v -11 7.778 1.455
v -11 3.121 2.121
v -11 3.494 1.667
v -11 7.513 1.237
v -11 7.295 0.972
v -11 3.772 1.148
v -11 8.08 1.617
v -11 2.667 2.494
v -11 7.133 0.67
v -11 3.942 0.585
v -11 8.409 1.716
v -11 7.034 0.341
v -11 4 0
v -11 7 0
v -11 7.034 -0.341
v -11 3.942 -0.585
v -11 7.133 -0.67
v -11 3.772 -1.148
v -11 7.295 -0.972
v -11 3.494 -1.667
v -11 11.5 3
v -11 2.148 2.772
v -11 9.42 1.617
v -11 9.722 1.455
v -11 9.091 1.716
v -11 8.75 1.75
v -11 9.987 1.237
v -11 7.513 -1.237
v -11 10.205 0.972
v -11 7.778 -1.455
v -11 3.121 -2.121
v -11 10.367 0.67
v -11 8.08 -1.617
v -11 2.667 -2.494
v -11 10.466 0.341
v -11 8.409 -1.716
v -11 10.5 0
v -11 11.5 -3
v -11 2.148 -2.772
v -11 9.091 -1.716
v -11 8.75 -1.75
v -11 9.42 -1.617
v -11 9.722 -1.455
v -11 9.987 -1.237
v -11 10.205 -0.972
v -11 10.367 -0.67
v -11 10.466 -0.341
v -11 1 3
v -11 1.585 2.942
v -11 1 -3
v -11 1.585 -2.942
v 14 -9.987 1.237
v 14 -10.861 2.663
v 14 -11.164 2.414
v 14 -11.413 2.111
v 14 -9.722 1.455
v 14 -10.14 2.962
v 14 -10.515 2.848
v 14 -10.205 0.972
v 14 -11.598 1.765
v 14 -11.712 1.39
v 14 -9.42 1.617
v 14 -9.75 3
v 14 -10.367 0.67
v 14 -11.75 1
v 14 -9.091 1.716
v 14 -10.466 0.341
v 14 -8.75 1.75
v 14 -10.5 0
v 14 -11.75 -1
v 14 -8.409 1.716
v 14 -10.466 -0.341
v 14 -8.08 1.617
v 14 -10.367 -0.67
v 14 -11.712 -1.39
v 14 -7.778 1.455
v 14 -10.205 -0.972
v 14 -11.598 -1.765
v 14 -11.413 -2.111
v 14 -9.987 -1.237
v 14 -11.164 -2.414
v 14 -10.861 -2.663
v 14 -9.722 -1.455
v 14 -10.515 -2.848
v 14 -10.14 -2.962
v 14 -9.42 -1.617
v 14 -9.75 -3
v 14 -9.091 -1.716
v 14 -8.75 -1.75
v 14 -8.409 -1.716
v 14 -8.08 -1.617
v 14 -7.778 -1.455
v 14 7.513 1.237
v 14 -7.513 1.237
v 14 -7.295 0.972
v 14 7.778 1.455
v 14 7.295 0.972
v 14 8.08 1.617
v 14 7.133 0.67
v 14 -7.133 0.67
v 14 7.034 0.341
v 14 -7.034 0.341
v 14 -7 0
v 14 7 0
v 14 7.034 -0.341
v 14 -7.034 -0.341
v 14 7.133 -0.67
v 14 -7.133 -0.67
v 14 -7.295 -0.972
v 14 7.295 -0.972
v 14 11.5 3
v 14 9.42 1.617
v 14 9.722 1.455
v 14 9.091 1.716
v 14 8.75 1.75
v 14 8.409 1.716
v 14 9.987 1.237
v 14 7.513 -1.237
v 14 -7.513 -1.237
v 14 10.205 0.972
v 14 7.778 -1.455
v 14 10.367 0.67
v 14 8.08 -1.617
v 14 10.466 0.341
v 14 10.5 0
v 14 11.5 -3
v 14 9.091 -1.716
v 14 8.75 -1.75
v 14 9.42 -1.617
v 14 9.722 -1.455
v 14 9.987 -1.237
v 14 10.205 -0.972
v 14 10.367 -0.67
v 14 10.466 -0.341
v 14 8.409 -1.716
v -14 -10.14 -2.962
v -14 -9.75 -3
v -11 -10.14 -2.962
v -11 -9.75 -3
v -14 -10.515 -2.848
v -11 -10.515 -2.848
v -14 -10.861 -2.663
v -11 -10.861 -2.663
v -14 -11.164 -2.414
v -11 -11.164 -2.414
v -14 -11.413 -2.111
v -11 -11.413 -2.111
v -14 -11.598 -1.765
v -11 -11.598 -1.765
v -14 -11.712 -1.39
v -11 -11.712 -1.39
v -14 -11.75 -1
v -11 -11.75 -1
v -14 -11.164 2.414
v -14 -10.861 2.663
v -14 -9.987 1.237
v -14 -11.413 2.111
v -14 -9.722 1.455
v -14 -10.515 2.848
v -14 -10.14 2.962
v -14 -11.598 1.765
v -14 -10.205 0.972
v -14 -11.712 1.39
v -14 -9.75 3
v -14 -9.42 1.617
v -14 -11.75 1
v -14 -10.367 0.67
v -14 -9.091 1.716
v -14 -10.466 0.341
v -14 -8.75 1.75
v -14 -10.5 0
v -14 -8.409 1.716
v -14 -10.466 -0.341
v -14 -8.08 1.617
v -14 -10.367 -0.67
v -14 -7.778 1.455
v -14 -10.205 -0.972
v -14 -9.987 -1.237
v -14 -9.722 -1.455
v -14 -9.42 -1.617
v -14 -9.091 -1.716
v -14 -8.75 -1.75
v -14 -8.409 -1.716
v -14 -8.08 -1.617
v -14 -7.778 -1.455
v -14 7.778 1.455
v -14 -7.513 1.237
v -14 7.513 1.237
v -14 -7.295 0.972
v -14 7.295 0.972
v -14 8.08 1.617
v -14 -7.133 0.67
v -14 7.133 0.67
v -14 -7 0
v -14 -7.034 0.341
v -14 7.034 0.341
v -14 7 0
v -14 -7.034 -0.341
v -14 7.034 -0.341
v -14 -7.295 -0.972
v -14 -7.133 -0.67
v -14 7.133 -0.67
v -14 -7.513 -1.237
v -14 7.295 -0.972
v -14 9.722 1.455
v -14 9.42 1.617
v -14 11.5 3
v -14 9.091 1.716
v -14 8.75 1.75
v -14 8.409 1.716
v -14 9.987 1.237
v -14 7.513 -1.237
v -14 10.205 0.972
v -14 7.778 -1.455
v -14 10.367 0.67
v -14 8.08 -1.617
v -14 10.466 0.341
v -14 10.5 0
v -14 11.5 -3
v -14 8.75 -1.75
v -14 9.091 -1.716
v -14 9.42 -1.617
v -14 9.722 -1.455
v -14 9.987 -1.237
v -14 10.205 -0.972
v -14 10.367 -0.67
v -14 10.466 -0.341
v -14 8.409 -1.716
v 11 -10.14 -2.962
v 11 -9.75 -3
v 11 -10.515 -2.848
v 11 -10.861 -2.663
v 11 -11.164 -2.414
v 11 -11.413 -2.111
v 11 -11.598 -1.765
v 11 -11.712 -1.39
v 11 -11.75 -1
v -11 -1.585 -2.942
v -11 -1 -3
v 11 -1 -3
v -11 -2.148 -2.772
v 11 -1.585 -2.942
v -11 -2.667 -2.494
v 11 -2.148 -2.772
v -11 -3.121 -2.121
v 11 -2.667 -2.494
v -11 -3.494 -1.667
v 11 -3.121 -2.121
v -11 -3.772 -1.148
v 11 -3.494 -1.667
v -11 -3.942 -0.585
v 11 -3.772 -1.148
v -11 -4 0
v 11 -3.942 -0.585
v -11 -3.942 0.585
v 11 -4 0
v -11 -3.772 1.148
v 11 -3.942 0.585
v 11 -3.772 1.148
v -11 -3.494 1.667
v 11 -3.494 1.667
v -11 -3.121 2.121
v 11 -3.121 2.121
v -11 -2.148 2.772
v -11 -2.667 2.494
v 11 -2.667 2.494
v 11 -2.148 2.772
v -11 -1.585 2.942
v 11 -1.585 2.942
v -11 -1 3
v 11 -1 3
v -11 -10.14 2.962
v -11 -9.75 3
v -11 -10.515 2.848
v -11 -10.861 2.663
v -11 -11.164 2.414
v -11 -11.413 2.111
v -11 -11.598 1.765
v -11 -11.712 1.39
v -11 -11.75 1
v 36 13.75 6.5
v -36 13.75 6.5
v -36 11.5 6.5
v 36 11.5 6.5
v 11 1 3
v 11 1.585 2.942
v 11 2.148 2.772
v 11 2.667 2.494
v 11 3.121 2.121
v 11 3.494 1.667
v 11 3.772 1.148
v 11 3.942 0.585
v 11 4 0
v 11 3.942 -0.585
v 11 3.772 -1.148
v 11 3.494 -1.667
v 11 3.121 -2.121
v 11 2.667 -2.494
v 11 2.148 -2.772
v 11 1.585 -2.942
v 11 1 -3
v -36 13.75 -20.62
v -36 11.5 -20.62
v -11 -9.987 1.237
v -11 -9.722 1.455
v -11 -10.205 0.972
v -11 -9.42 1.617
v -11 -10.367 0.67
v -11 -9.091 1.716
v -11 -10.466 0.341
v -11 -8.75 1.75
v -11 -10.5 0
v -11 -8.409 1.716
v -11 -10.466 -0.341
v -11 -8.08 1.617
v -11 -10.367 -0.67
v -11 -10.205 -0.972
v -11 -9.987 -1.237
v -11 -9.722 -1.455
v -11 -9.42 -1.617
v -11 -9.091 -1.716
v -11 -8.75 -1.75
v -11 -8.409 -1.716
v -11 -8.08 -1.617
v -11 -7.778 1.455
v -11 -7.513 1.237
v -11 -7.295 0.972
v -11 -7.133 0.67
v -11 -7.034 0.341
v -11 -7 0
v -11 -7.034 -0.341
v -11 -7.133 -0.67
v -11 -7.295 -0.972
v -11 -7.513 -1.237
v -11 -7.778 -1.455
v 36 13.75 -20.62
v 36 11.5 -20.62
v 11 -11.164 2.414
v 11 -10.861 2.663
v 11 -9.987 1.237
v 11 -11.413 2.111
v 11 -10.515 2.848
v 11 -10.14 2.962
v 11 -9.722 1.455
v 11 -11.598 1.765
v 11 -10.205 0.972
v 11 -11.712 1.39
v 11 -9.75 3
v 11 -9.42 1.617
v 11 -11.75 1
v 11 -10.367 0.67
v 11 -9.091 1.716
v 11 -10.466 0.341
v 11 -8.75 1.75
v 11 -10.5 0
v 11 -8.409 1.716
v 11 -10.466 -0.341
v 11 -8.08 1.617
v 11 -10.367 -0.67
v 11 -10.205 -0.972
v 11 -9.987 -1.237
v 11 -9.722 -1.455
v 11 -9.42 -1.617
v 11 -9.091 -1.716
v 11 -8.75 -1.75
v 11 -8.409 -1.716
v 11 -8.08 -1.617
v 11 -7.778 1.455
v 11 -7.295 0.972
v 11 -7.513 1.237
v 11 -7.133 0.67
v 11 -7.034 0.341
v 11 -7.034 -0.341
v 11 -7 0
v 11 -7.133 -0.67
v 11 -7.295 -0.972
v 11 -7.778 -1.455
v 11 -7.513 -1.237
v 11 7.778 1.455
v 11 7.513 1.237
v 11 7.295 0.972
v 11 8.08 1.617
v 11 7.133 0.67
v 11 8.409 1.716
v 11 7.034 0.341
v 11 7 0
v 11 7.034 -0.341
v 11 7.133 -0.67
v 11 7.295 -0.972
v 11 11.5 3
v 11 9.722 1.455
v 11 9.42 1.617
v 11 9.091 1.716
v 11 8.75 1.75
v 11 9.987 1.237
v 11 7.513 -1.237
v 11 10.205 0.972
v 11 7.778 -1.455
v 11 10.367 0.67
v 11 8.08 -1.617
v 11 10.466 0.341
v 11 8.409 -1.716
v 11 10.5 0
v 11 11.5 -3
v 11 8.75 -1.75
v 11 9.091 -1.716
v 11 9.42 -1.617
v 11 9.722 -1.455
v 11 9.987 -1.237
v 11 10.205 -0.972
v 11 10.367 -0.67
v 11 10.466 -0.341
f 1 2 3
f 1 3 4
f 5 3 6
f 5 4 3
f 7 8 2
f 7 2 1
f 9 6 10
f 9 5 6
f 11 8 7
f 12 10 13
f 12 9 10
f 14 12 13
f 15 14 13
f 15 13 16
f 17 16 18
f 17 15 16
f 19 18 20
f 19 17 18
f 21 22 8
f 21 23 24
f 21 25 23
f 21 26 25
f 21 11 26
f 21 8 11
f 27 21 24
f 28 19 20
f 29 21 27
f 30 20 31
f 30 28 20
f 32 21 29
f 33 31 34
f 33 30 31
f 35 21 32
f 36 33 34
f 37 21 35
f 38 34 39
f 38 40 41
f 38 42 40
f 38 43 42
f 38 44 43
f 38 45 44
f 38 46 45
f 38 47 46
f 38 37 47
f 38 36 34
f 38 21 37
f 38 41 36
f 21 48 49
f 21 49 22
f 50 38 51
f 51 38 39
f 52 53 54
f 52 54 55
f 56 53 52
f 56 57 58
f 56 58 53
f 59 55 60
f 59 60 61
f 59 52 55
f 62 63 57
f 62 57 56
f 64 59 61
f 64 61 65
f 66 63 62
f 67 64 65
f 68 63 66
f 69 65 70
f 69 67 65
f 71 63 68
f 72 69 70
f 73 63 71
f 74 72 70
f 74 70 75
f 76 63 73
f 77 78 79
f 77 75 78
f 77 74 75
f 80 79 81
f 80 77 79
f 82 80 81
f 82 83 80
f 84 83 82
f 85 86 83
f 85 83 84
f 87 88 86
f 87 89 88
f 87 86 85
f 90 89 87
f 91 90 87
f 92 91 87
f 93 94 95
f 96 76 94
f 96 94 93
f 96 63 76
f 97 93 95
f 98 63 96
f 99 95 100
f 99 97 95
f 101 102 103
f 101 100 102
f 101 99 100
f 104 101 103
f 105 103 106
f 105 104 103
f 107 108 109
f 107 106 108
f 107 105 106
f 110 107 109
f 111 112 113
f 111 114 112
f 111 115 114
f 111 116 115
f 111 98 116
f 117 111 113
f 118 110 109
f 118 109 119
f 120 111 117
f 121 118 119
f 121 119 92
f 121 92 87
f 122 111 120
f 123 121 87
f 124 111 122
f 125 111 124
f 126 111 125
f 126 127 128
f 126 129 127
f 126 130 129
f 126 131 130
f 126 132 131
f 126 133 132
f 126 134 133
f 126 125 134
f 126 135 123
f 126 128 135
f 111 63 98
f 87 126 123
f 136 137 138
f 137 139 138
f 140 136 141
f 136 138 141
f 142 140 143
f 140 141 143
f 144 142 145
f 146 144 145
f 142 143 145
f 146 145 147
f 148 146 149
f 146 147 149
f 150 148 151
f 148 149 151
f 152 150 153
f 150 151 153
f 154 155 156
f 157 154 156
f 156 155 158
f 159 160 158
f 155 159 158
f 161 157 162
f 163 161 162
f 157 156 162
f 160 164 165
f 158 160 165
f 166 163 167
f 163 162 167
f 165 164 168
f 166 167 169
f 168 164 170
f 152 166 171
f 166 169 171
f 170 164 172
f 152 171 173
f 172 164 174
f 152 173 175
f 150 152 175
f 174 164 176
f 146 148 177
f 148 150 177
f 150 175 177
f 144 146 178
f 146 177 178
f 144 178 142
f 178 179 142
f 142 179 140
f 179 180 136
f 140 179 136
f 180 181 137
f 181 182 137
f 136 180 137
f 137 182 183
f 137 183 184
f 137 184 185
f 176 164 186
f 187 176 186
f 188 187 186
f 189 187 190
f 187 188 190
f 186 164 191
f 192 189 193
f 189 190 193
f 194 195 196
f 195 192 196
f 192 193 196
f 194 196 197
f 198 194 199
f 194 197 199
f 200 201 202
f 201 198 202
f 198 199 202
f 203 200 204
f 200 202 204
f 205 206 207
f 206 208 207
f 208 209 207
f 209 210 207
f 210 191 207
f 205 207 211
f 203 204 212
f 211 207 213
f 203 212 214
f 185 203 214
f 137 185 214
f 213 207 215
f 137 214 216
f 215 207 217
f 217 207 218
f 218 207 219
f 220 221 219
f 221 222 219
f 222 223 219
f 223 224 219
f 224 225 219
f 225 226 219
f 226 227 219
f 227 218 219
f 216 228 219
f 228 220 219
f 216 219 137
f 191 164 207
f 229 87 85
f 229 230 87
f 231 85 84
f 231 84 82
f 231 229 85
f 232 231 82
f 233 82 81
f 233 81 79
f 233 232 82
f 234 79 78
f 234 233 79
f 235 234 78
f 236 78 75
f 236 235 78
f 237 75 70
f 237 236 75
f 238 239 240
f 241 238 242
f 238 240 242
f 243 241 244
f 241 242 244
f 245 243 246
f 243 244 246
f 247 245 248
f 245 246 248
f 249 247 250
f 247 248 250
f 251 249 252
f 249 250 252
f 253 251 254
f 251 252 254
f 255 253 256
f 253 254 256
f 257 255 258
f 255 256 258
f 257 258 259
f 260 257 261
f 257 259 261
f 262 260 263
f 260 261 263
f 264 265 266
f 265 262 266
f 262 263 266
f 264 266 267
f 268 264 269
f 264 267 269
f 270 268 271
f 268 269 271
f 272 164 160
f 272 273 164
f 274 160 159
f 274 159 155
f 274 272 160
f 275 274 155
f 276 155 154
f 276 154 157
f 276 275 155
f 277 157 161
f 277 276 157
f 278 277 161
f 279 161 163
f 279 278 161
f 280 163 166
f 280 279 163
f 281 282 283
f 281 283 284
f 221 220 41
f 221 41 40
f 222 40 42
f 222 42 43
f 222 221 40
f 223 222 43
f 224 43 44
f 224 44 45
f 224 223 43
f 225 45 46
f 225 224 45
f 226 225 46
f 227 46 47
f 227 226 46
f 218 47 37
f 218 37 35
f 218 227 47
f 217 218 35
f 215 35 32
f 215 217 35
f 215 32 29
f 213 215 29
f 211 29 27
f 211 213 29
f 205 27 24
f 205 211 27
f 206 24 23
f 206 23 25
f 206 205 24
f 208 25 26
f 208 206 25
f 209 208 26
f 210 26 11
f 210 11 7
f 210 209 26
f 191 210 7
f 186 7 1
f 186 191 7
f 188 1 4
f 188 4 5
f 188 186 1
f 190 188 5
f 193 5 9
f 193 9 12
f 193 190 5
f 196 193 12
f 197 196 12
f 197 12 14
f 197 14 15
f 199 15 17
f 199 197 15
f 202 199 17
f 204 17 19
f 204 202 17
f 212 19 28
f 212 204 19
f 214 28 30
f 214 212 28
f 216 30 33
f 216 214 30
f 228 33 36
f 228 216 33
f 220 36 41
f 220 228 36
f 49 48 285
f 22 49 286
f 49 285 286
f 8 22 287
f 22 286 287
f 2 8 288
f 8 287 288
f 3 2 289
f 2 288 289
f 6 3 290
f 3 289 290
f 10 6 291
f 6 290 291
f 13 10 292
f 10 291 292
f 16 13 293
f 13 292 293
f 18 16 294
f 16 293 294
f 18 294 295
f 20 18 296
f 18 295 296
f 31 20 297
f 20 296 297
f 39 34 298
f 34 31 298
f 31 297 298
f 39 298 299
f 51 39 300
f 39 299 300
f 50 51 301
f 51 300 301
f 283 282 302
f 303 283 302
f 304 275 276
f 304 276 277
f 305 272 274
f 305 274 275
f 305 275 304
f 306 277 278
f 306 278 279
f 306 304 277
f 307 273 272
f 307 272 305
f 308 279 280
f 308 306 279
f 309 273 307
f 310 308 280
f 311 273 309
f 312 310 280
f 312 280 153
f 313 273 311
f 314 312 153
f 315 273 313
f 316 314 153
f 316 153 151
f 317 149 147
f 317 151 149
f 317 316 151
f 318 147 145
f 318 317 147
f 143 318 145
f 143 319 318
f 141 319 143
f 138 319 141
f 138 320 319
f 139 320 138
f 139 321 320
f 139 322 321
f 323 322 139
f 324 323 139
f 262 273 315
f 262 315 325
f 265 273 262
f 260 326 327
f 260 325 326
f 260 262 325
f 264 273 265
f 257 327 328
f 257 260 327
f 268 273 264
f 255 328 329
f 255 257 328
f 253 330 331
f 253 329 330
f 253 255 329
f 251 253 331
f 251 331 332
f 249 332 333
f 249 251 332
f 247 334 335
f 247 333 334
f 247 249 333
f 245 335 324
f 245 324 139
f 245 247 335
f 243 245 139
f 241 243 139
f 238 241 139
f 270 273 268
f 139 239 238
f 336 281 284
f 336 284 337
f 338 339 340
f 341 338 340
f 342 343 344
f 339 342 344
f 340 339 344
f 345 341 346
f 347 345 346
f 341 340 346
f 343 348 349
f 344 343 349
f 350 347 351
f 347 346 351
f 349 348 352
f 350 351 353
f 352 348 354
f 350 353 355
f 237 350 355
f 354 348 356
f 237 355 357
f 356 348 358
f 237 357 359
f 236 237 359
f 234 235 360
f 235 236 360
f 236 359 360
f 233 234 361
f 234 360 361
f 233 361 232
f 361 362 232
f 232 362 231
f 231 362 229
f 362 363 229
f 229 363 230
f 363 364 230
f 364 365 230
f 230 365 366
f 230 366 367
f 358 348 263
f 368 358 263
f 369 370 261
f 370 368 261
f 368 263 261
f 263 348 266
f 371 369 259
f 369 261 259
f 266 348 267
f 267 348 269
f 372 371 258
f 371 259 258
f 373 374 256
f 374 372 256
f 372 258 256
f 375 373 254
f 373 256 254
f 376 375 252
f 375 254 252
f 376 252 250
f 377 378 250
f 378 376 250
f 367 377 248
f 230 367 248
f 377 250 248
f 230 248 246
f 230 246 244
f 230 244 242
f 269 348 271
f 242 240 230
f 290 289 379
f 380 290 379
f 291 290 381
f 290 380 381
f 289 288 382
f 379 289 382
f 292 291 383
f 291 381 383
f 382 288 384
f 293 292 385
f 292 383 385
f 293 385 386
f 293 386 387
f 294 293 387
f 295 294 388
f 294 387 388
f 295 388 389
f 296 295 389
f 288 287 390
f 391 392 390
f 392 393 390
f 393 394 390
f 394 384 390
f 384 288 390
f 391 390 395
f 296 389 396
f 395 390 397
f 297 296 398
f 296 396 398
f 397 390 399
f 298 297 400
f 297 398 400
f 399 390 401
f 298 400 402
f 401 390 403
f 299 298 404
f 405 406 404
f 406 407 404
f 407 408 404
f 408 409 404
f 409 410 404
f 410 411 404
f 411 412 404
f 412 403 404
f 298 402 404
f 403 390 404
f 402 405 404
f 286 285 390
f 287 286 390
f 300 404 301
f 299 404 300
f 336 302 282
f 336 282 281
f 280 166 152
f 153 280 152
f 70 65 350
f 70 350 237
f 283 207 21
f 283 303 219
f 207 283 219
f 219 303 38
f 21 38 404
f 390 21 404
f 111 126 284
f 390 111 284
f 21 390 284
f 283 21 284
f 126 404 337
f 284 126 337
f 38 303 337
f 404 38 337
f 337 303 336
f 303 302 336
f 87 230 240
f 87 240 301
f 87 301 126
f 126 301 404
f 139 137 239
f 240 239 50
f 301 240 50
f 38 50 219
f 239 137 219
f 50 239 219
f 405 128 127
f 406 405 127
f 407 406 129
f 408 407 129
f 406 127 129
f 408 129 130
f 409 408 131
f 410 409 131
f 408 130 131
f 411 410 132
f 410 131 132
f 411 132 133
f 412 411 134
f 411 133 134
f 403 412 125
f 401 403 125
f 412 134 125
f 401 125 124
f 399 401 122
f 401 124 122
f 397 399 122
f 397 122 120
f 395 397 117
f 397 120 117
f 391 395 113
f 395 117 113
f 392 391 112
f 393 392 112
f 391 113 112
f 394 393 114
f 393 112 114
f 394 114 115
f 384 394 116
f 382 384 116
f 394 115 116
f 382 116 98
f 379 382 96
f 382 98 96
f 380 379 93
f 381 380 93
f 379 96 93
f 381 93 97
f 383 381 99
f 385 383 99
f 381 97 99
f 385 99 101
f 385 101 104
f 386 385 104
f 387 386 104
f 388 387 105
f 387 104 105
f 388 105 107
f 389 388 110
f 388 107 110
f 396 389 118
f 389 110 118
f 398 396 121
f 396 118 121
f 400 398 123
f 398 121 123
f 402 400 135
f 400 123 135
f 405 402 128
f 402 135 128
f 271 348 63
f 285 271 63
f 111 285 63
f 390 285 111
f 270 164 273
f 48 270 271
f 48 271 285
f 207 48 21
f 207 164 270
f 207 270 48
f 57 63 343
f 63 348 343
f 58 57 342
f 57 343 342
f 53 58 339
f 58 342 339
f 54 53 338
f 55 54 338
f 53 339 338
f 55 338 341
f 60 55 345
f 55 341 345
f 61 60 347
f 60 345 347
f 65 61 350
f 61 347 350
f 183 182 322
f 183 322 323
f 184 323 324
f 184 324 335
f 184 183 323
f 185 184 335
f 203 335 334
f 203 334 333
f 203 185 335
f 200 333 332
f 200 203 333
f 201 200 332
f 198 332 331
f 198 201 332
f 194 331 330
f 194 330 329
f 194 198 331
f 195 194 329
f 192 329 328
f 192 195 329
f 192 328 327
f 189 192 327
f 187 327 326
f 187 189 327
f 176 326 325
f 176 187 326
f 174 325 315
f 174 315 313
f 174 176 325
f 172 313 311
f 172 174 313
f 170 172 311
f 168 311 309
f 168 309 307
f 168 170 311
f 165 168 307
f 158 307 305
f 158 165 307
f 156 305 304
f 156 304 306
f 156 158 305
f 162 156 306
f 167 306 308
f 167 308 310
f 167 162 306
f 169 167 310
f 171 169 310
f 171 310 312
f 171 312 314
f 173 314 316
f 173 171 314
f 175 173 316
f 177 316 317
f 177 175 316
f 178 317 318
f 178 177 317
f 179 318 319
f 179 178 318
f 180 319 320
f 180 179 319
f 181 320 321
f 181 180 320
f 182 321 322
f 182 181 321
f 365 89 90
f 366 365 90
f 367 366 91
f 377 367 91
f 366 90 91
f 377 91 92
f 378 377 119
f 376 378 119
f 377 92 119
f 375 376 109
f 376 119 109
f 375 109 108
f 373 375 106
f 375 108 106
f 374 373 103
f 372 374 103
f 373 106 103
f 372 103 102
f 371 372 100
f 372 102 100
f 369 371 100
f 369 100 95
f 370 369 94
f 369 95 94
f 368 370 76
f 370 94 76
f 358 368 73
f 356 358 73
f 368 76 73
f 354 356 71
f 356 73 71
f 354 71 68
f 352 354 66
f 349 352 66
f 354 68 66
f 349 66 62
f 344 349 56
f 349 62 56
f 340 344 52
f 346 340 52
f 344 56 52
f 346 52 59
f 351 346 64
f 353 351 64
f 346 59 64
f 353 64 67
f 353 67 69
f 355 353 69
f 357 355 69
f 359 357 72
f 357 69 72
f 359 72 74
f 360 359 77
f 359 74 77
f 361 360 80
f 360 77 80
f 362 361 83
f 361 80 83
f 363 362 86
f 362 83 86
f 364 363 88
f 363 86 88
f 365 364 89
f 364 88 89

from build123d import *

# Parameters (mm, degrees)
SALIENTE_EXTRUIR1_DEPTH      = 14
CROQUIS3_W                   = 6
CROQUIS3_H                   = 23.5
CROQUIS3_R                   = 1.75
SALIENTE_EXTRUIR2_DEPTH      = 3
REDONDEO1_R                  = 2
REDONDEO1_OF_SIMETR_A1_R     = 2
CROQUIS6_W                   = 72
CROQUIS6_H                   = 27.119895789
SALIENTE_EXTRUIR5_DEPTH      = 2
SALIENTE_EXTRUIR5_DEPTH_BACK = 0.25


with BuildPart() as part:
    # Croquis2 → Saliente-Extruir1 (new body)
    with BuildSketch(Plane(origin=(0, 0, 0), x_dir=(0, 0, -1), z_dir=(1, 0, 0))):
        with BuildLine():
            Line((-3, -1), (-3, 1))
            ThreePointArc((-3, 1), (0, 4), (3, 1))
            Line((3, 1), (3, -1))
            ThreePointArc((3, -1), (0, -4), (-3, -1))
        make_face()
    saliente_extruir1 = extrude(amount=SALIENTE_EXTRUIR1_DEPTH)

    # Croquis3 → Saliente-Extruir2 (add)
    with BuildSketch(Plane(origin=(14, 0, 0), x_dir=(0, 0, -1), z_dir=(1, 0, 0))):
        Rectangle(CROQUIS3_W, CROQUIS3_H)
        with Locations((0, 8.75)):
            Circle(CROQUIS3_R, mode=Mode.SUBTRACT)
        with Locations((0, -8.75)):
            Circle(CROQUIS3_R, mode=Mode.SUBTRACT)
    saliente_extruir2 = extrude(amount=-SALIENTE_EXTRUIR2_DEPTH)

    # Redondeo1
    redondeo1_edges = [part.edges().sort_by_distance(p)[0] for p in [
        (12.5, -11.75, -3),
        (12.5, -11.75, 3),
    ]]
    fillet(redondeo1_edges, radius=REDONDEO1_R)

    # Simetría1: Saliente-Extruir1, Saliente-Extruir2 across plane
    add(saliente_extruir1.mirror(Plane(origin=(0, 0, 0), x_dir=(0, 0, 1), z_dir=(1, 0, 0))))
    add(saliente_extruir2.mirror(Plane(origin=(0, 0, 0), x_dir=(0, 0, 1), z_dir=(1, 0, 0))))

    # Redondeo1 of Simetría1
    redondeo1_of_simetr_a1_edges = [part.edges().sort_by_distance(p)[0] for p in [
        (-12.5, -11.75, -3),
        (-12.5, -11.75, 3),
    ]]
    fillet(redondeo1_of_simetr_a1_edges, radius=REDONDEO1_OF_SIMETR_A1_R)

    # Croquis6 → Saliente-Extruir5 (add, two sides)
    with BuildSketch(Plane(origin=(0, 11.75, 0), x_dir=(1, 0, 0), z_dir=(0, 1, 0))) as saliente_extruir5_sk:
        with Locations((0, 7.059947895)):
            Rectangle(CROQUIS6_W, CROQUIS6_H)
    extrude(amount=SALIENTE_EXTRUIR5_DEPTH)
    extrude(saliente_extruir5_sk.sketch, amount=-SALIENTE_EXTRUIR5_DEPTH_BACK)


solid = part.part
